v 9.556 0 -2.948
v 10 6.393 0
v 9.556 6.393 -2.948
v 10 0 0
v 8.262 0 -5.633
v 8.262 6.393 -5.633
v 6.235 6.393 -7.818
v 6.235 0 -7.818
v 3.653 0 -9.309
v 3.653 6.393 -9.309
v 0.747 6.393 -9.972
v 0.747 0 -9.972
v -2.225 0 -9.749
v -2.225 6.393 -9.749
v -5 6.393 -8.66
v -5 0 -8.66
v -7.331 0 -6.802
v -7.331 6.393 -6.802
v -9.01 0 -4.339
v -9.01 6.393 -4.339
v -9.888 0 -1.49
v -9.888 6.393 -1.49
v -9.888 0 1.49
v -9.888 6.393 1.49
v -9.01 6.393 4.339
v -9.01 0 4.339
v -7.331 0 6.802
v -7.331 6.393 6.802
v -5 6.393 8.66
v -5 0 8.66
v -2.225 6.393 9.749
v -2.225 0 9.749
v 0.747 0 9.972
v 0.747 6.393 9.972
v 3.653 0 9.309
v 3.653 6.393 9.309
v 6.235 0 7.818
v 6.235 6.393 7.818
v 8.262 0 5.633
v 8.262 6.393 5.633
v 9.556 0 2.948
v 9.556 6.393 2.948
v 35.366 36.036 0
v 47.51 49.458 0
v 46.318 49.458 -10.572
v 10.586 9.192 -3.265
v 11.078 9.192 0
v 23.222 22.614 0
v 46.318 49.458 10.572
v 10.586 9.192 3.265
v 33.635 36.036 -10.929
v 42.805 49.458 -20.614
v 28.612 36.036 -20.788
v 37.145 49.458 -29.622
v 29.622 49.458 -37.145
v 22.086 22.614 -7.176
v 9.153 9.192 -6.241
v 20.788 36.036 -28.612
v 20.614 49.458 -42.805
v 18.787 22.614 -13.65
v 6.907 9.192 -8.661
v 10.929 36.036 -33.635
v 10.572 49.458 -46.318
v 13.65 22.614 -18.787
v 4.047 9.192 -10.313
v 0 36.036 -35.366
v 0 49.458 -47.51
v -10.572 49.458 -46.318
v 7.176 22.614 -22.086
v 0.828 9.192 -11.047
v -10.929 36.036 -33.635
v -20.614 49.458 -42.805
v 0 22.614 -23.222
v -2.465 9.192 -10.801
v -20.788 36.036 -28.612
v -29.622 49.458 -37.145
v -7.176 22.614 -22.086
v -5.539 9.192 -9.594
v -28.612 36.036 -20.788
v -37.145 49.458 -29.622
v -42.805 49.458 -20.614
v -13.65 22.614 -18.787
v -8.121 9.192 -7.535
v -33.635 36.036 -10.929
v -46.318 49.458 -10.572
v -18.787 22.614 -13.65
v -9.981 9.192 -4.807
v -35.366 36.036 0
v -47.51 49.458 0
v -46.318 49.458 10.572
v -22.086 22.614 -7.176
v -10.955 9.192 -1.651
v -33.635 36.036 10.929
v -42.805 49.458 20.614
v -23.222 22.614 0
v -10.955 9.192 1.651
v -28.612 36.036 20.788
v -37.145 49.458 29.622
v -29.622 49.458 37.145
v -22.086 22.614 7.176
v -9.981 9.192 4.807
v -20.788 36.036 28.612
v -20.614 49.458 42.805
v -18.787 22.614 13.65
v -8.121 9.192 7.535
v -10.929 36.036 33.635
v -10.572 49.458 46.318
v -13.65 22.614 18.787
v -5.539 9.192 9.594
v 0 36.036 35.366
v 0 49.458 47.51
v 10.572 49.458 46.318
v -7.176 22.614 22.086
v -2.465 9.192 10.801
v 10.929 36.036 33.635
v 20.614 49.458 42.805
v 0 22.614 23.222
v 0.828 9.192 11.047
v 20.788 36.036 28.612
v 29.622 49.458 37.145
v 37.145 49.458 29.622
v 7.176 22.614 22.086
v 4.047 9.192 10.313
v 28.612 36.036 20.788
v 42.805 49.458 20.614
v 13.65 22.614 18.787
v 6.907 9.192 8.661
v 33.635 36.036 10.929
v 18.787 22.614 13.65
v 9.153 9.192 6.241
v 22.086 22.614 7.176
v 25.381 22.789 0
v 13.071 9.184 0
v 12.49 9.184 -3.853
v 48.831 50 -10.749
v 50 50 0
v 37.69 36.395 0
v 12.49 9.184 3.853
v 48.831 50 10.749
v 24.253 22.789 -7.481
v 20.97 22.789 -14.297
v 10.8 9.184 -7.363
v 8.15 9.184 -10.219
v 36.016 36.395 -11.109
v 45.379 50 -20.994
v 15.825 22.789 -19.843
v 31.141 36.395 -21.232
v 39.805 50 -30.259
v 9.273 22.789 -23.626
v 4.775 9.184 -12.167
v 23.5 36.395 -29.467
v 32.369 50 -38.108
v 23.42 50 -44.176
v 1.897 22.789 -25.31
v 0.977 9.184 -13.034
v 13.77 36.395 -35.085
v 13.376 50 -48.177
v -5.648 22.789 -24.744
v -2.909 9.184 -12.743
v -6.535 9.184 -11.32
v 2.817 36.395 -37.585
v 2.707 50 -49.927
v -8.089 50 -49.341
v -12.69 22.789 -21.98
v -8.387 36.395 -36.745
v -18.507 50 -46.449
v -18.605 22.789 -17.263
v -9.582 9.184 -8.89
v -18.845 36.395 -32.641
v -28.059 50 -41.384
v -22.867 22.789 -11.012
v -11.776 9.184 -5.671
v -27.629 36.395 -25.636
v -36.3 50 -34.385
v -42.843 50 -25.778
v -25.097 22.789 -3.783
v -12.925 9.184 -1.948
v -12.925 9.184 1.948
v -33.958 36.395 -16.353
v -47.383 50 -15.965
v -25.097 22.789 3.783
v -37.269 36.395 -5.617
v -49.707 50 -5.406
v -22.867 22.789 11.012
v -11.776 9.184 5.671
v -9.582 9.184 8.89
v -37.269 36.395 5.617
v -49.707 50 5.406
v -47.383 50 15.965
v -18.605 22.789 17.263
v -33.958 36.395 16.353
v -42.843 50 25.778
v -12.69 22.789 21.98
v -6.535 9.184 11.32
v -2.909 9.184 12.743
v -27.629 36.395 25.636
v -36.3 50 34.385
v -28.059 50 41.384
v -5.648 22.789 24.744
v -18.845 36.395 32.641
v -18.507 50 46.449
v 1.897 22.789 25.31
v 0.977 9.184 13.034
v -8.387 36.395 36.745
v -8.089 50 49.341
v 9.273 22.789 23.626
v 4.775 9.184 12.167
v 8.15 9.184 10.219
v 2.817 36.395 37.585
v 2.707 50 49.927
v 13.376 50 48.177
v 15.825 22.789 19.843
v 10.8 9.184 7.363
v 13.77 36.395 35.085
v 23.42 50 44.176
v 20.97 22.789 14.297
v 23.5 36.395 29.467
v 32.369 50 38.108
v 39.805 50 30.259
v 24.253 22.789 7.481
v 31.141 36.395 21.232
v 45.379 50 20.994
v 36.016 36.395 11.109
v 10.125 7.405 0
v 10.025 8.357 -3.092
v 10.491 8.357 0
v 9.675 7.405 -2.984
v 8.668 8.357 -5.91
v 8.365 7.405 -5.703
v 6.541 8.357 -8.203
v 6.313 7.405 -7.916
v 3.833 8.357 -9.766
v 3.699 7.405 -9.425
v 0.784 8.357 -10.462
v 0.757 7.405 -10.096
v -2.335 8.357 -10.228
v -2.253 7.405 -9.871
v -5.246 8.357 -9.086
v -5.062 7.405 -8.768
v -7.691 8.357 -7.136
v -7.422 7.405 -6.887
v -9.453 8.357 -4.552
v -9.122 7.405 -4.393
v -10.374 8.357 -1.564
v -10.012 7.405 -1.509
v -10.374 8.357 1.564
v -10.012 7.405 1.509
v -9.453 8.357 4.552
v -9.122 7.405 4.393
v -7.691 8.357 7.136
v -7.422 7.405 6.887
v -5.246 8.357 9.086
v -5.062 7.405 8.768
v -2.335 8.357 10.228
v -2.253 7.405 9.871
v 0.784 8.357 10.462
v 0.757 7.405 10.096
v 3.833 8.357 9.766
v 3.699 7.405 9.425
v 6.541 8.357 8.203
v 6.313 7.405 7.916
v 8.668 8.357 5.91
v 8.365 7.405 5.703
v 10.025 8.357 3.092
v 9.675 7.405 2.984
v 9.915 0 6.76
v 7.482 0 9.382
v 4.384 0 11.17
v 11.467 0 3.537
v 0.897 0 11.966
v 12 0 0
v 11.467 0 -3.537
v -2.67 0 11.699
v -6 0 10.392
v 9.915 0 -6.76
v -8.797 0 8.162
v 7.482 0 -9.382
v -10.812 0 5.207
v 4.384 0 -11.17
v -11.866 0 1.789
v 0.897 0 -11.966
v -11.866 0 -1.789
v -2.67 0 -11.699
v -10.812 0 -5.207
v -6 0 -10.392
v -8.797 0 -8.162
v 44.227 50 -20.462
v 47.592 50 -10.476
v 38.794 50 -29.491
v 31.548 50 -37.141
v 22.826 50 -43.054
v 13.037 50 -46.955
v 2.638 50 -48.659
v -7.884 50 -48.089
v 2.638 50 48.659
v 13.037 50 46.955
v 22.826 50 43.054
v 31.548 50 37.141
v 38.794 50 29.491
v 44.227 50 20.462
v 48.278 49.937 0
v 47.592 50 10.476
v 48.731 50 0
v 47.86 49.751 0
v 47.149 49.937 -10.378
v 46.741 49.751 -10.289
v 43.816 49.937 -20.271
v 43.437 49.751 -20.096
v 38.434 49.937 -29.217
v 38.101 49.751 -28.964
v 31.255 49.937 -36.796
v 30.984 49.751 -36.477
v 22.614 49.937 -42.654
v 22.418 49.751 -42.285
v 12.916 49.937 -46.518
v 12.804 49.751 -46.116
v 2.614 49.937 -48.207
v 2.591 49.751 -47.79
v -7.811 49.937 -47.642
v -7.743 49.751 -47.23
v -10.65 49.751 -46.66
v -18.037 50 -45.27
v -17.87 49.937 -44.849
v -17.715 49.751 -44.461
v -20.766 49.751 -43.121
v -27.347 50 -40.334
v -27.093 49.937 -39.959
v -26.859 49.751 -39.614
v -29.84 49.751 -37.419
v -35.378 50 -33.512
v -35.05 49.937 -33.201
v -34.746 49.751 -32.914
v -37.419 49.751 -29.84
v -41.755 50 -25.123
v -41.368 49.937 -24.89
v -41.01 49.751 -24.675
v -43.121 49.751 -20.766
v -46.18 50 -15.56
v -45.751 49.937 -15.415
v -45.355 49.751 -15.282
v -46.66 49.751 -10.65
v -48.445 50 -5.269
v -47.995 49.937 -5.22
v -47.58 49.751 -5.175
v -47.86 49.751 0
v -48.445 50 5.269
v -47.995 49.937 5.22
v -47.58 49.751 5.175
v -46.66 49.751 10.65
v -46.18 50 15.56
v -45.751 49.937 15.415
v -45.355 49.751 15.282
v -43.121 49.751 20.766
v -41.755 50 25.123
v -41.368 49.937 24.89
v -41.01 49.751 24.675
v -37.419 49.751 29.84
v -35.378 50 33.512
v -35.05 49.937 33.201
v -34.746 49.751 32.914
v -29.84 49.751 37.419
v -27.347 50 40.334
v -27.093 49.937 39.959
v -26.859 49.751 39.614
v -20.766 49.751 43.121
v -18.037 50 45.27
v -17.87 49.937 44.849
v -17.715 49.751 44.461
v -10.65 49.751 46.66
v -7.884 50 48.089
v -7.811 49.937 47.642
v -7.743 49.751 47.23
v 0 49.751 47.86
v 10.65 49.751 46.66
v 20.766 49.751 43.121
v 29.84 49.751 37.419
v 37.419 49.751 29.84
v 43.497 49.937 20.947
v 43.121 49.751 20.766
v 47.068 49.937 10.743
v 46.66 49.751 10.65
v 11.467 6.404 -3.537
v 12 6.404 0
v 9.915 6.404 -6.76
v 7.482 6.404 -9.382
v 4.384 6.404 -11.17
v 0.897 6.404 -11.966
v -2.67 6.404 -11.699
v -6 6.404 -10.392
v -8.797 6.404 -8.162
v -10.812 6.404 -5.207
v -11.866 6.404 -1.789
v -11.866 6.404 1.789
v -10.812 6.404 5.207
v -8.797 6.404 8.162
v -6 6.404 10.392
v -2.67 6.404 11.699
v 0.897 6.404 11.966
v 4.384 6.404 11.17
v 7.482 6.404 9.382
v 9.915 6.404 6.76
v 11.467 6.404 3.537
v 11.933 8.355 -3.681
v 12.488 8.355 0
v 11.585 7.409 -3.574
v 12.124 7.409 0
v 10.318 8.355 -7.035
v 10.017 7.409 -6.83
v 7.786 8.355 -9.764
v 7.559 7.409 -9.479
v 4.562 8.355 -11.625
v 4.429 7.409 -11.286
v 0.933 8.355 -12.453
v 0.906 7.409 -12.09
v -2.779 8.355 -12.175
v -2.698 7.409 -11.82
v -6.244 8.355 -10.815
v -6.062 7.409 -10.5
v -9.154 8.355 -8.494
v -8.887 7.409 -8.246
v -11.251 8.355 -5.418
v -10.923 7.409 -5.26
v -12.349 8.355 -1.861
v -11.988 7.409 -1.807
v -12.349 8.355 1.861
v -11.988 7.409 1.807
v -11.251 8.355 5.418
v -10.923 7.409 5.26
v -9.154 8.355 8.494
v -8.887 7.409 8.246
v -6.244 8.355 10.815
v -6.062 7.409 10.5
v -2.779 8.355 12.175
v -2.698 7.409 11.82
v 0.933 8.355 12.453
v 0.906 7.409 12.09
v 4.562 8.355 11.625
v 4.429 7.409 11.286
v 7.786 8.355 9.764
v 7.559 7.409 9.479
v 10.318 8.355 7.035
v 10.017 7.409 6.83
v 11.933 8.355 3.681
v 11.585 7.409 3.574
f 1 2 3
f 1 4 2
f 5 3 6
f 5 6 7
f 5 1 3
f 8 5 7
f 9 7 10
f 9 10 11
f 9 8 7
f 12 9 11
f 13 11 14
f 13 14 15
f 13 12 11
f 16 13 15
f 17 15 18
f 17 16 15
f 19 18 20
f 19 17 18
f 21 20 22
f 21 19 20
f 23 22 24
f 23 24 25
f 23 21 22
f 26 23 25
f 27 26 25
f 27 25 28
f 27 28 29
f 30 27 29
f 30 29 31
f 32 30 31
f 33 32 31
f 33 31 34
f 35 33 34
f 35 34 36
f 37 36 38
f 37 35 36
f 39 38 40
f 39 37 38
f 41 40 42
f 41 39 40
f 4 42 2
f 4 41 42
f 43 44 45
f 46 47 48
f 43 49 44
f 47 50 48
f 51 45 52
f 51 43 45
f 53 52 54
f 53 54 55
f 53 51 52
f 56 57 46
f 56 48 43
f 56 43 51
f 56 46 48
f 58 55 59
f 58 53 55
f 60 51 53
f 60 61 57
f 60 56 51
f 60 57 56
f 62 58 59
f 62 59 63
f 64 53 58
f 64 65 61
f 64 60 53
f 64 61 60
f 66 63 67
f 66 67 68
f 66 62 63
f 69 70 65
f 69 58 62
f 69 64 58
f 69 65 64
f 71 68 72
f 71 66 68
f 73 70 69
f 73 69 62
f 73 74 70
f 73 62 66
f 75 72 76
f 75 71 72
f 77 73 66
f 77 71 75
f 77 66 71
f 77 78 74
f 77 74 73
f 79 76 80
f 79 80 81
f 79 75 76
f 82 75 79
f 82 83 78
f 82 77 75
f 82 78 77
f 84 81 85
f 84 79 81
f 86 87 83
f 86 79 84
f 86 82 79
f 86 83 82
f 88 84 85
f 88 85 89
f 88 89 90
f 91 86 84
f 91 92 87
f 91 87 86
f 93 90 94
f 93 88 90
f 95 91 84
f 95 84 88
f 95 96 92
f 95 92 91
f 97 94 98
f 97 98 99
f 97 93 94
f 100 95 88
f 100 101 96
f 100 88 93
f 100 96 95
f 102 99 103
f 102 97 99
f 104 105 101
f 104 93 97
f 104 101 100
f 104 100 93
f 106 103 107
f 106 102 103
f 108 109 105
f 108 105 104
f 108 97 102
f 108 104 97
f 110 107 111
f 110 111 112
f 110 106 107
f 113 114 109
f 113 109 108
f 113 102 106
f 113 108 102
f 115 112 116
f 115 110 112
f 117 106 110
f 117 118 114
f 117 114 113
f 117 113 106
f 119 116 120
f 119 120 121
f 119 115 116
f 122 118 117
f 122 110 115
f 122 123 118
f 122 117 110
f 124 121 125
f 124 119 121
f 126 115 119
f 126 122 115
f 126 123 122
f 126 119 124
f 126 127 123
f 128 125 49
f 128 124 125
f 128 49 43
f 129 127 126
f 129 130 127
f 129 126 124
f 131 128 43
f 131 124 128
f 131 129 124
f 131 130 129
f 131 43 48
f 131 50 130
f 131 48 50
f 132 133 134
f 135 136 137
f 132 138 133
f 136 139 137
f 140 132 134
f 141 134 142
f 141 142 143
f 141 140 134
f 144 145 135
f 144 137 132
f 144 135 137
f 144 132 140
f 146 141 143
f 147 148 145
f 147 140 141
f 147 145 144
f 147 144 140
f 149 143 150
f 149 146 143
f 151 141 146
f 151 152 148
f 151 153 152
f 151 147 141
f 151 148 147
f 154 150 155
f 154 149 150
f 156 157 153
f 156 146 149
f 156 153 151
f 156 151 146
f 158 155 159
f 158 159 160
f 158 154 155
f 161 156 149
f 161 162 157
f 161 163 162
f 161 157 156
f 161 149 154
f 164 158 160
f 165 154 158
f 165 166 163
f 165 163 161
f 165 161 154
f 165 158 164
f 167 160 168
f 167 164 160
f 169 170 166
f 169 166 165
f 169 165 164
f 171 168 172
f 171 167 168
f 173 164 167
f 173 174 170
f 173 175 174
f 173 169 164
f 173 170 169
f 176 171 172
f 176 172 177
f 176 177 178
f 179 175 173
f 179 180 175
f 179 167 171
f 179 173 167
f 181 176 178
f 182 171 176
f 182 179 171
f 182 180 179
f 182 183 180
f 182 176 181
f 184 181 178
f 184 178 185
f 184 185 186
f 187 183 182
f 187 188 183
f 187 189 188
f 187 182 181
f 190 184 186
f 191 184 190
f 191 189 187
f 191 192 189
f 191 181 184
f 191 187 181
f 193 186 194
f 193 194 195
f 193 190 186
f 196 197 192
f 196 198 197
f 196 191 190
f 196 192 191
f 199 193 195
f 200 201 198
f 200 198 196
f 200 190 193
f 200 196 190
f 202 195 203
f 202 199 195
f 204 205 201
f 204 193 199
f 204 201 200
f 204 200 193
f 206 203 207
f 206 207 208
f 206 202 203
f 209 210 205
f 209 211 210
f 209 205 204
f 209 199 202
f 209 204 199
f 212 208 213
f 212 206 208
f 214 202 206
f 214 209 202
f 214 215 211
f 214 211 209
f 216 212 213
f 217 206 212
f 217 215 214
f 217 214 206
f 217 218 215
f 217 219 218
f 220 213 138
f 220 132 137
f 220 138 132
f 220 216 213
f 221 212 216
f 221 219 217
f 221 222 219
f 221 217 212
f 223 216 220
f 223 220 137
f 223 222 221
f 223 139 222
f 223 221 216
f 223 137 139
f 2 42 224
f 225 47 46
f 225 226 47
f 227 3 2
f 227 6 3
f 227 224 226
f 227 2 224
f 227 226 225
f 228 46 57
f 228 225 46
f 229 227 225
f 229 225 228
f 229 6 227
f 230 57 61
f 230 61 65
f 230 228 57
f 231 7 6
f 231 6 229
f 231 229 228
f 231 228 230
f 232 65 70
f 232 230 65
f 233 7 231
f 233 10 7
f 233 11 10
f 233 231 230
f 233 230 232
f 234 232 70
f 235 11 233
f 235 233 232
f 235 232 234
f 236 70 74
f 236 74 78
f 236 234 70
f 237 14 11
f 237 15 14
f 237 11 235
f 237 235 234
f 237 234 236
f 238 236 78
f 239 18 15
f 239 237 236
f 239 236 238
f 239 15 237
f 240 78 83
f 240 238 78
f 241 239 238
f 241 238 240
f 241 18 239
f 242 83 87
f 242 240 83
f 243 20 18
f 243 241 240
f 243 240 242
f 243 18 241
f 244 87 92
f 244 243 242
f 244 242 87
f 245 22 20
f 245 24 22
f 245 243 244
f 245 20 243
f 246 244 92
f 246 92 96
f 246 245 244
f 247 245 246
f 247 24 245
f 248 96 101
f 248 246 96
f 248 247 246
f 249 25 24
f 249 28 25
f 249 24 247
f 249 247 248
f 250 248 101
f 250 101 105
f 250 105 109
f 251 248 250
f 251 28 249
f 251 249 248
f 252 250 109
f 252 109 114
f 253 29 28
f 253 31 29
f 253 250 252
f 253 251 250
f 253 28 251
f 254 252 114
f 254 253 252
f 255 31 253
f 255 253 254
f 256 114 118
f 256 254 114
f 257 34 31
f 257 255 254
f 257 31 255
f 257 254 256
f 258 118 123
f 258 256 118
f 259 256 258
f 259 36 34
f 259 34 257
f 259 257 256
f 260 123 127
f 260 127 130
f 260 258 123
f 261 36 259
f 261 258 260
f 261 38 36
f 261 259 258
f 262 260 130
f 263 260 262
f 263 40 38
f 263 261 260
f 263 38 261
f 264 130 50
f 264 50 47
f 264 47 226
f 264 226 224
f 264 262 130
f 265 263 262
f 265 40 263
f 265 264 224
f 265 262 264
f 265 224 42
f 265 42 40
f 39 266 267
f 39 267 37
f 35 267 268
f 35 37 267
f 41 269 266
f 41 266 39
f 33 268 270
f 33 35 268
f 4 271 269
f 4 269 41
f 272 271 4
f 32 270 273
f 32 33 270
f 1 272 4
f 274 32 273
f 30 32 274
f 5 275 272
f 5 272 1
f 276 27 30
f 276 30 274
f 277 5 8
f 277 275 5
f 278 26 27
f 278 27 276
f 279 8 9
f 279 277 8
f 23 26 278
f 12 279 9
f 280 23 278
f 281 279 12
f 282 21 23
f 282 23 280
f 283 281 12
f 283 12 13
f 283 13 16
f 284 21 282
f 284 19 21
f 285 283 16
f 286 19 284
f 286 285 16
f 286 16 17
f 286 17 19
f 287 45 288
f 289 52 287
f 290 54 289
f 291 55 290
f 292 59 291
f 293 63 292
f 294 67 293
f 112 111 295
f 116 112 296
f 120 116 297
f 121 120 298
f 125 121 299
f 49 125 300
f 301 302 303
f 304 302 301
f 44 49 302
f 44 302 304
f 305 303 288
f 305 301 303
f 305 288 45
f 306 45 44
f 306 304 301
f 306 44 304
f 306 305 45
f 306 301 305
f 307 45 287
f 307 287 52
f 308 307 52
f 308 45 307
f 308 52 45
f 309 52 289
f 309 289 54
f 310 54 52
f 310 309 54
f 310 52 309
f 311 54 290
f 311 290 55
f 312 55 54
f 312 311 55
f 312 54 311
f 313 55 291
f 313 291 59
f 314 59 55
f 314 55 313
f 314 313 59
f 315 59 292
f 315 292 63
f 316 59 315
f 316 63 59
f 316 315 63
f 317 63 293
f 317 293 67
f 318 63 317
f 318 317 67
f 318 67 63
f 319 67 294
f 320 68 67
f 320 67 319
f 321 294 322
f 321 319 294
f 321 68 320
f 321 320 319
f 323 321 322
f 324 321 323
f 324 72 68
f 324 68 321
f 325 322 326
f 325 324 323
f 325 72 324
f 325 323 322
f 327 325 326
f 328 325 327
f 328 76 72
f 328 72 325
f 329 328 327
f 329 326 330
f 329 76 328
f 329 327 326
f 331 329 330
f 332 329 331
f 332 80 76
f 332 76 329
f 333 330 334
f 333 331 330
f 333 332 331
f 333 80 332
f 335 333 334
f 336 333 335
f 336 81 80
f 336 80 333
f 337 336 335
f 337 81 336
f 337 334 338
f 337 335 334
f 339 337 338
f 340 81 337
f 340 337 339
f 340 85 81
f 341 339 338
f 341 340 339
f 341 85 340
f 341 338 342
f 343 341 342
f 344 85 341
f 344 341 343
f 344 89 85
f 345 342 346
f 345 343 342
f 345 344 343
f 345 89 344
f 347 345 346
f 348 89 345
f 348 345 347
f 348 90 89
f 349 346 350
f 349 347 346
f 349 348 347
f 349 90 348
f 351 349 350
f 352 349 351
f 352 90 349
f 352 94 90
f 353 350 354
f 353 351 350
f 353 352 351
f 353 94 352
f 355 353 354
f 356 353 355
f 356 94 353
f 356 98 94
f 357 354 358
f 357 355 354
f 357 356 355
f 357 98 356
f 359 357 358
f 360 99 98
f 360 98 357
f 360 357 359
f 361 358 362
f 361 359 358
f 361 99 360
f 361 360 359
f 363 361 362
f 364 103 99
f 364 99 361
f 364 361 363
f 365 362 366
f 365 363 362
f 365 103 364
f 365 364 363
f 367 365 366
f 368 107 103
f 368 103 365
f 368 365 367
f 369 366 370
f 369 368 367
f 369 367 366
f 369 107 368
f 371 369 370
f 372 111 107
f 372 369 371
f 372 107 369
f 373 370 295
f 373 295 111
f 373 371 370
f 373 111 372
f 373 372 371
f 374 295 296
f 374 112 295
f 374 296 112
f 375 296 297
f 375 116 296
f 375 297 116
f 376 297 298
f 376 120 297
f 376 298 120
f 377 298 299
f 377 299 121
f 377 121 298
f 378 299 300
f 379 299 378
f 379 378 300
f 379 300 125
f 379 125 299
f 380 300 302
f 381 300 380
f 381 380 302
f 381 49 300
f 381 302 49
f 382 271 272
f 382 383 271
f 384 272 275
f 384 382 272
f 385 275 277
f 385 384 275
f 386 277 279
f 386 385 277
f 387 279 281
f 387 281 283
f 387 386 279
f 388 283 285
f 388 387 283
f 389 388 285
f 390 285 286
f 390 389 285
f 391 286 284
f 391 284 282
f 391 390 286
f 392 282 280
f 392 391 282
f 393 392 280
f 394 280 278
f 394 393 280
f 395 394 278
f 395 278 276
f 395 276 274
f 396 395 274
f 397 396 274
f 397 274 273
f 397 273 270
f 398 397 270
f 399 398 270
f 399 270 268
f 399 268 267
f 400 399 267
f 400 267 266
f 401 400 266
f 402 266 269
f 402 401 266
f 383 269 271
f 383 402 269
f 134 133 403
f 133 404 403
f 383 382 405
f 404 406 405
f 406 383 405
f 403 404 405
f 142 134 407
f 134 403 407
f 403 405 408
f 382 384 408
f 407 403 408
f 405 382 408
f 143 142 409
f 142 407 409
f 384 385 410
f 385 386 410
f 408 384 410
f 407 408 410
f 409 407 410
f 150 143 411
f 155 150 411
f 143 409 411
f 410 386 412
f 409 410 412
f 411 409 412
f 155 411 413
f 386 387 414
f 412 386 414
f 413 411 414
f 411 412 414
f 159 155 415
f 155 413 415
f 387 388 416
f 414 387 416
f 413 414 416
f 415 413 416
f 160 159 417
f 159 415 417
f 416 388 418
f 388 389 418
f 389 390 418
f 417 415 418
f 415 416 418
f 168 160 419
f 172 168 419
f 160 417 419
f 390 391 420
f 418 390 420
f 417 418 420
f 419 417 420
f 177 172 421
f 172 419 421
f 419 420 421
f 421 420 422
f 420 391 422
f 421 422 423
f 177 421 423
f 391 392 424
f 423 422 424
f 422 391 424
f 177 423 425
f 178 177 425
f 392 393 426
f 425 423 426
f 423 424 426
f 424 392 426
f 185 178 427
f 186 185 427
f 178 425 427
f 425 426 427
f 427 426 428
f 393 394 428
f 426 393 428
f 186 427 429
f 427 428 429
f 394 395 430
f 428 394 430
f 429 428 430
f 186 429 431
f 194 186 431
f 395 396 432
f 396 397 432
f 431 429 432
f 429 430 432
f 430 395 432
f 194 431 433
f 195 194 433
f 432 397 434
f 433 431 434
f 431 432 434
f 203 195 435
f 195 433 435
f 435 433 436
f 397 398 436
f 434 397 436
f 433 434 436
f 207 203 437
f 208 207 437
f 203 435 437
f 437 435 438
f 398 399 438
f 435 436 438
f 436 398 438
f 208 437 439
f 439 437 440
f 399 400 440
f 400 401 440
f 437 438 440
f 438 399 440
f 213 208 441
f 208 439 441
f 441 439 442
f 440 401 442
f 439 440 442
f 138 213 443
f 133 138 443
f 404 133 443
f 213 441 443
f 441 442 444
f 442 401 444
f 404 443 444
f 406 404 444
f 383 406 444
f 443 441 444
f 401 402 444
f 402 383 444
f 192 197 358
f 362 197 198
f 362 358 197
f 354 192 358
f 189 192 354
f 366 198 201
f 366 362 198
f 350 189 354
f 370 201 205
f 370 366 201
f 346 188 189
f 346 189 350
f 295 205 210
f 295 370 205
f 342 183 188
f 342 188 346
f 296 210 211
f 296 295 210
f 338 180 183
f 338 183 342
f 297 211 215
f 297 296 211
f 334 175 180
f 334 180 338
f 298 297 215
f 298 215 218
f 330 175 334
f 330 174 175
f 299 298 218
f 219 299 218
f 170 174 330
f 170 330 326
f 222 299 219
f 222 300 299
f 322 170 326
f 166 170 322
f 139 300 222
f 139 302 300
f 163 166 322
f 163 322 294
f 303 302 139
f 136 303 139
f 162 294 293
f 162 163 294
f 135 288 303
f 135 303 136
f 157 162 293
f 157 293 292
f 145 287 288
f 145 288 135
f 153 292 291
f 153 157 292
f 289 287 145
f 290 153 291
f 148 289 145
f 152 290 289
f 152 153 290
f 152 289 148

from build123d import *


with BuildPart() as part:
    # Sketch → Revolution (revolve)
    with BuildSketch(Plane.XY):
        with BuildLine():
            Line((10, 0), (12, 0))
            Line((12, 0), (12, 6.403799))
            ThreePointArc((13.070912, 9.18364), (12.276986, 7.893293), (12, 6.403799))
            Line((13.070912, 9.18364), (50, 50))
            Line((50, 50), (48.730875, 50))
            ThreePointArc((48.730875, 50), (48.062831, 49.858422), (47.509646, 49.45803))
            Line((47.509646, 49.45803), (11.078349, 9.19186))
            ThreePointArc((11.078349, 9.19186), (10.27891, 7.892552), (10, 6.392715))
            Line((10, 6.392715), (10, 0))
        make_face()
    revolve(axis=Axis((0, 0, 0), (0, 1, 0)))


solid = part.part
